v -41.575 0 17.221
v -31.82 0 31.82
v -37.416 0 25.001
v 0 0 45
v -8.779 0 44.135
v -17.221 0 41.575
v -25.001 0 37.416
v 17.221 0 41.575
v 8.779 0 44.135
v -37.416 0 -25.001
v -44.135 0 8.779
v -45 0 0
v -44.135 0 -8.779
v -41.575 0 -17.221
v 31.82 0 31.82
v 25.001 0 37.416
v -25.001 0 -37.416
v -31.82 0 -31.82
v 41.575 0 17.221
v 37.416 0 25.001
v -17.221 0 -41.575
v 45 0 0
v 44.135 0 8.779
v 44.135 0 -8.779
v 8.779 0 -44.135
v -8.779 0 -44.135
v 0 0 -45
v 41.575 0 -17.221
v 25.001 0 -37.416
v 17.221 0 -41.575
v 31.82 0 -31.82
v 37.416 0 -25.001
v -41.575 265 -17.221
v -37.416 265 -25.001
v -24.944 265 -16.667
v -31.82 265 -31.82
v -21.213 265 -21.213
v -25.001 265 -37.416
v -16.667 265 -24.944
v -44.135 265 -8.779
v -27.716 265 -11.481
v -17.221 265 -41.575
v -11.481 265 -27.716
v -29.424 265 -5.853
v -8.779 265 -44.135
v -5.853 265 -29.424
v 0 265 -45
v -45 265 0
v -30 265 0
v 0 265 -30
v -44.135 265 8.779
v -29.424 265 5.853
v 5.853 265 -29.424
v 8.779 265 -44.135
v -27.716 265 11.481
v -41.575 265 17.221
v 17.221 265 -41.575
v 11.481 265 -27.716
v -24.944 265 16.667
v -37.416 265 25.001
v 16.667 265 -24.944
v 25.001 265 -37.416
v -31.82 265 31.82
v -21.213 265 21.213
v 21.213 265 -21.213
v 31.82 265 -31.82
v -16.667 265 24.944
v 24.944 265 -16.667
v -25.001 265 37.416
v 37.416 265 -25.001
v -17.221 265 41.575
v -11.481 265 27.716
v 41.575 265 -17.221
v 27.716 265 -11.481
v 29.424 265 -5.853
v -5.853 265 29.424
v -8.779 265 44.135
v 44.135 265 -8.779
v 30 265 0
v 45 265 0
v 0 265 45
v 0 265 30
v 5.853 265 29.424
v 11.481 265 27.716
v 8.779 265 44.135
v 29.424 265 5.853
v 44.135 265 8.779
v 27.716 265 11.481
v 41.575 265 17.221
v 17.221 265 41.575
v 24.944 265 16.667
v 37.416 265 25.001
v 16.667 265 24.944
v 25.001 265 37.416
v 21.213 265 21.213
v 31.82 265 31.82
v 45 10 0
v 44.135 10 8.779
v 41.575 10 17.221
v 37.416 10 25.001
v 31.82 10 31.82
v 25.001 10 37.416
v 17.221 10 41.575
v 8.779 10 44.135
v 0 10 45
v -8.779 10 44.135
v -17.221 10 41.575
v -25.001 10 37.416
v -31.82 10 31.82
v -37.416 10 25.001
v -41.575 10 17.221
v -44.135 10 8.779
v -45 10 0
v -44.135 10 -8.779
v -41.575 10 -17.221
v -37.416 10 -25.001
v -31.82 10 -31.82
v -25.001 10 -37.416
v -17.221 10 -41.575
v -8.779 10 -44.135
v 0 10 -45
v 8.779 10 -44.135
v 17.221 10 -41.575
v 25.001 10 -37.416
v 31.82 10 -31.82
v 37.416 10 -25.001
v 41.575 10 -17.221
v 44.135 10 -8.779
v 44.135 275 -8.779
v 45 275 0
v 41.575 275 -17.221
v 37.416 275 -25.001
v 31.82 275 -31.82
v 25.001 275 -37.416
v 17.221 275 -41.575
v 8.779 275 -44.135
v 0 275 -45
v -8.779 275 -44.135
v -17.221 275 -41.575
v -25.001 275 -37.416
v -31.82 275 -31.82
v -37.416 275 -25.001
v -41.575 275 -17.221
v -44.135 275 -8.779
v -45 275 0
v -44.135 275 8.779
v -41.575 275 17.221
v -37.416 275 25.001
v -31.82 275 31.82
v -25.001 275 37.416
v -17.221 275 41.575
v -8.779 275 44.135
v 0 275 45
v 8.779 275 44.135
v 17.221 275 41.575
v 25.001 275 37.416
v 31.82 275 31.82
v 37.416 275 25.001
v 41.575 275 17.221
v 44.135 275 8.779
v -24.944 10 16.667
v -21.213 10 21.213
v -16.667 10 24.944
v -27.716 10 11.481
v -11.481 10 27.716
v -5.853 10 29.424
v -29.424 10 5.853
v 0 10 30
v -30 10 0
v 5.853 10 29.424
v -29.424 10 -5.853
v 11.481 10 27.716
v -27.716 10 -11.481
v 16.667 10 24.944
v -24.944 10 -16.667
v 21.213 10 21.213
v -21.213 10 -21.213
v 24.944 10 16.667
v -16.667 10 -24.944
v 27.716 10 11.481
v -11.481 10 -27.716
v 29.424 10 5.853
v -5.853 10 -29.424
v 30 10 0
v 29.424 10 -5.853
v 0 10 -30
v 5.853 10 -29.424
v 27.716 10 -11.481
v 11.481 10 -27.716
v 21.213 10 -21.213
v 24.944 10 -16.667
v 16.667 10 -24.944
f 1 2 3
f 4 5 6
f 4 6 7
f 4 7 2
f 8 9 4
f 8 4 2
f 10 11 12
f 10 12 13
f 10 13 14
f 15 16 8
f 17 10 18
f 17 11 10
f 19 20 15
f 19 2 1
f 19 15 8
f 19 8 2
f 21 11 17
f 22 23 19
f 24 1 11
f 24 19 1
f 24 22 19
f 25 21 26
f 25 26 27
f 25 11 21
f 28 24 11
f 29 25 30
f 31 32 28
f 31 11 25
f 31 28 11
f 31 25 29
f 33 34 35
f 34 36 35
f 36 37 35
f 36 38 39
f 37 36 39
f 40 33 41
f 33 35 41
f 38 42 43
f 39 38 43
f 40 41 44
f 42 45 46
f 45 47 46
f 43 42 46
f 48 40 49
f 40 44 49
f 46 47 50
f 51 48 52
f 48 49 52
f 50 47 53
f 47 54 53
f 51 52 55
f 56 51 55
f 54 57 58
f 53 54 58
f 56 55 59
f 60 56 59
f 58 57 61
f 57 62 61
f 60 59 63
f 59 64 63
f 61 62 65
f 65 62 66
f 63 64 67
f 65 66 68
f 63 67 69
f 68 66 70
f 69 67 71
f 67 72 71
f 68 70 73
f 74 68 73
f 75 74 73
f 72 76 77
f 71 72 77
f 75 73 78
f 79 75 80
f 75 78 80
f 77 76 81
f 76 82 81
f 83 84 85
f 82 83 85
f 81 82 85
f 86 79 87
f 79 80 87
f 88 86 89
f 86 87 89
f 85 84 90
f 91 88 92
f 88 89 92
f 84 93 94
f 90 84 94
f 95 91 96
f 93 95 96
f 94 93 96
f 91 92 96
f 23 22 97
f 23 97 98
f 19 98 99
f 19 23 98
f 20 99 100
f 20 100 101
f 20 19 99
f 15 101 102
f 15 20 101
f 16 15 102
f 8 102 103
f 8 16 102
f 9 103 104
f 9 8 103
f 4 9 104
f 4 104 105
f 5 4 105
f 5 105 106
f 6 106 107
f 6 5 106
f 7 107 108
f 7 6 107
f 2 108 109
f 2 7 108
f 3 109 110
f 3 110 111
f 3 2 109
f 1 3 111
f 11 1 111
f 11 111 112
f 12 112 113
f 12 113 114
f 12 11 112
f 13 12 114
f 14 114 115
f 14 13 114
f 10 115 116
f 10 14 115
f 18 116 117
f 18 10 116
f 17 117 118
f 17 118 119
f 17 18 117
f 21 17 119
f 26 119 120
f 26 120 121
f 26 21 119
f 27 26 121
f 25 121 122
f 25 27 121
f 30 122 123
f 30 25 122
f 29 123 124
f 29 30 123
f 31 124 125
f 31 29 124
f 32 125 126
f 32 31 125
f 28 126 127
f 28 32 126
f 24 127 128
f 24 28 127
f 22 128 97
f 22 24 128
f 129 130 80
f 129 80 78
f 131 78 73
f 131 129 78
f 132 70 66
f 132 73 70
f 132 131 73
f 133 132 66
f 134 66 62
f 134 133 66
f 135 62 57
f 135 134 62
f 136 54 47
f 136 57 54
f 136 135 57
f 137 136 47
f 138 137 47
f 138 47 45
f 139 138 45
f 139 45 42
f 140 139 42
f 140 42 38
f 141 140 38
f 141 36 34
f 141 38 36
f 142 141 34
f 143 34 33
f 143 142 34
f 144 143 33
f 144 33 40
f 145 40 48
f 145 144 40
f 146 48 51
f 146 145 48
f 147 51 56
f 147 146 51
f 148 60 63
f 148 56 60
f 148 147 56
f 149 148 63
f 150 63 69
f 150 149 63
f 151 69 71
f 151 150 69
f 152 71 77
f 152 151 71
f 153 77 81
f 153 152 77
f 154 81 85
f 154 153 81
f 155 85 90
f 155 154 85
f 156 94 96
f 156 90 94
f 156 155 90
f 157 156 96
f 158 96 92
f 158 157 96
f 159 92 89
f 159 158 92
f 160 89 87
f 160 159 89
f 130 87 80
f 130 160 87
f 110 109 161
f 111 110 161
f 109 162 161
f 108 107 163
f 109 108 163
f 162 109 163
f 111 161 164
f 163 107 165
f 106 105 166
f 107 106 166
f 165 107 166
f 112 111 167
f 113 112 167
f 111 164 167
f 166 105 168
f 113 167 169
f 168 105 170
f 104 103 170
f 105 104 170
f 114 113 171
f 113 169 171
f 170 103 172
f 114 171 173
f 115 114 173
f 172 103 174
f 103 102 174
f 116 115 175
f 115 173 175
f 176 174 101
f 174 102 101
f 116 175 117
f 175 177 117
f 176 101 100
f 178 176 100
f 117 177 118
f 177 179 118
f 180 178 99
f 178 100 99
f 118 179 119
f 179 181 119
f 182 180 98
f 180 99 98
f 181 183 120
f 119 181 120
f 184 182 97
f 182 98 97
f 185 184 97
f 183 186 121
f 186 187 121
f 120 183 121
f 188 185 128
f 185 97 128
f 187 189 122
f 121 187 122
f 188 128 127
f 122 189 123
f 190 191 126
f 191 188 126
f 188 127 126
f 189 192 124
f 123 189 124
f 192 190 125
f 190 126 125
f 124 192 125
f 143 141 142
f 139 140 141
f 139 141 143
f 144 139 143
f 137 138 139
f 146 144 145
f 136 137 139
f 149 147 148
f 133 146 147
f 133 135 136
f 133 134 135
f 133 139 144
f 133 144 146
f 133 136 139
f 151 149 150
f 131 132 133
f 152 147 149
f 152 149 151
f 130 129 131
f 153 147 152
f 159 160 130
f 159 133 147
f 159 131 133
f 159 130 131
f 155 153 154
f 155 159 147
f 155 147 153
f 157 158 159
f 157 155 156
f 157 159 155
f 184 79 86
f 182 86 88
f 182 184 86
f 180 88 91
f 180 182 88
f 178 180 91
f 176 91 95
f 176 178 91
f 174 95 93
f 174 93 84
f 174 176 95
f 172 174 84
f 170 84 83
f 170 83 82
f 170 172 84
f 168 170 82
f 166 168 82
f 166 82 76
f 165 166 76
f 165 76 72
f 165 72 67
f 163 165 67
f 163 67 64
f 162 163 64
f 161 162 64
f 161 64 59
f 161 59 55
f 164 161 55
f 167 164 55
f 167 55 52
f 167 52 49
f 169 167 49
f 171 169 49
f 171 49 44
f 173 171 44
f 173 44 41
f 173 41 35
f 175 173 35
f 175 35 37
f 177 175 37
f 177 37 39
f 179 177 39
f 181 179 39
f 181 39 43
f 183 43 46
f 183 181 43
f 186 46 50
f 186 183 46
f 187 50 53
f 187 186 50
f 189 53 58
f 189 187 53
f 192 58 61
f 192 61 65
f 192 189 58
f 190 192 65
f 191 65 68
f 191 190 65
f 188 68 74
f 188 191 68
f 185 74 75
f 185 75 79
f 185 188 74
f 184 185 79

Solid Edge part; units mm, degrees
sketch "Sketch1" plane through (0, 0, 0) normal (0, -1, 0) x (1, 0, 0)
  circle A0 centre (0, 0) radius 30
extrude "Protrusion1" add sketch "Sketch1" against normal blind 275
sketch "Sketch2" plane through (0, 0, 0) normal (0, -1, 0) x (1, 0, 0)
  circle A0 centre (0, 0) radius 45
  dimension "D1" = 90
extrude "ExtrudedProtrusion_2" add sketch "Sketch2" against normal blind 10
mirror "Mirror1" about plane through (0, 137.5, 0) normal (0, -1, 0) of "ExtrudedProtrusion_2"
